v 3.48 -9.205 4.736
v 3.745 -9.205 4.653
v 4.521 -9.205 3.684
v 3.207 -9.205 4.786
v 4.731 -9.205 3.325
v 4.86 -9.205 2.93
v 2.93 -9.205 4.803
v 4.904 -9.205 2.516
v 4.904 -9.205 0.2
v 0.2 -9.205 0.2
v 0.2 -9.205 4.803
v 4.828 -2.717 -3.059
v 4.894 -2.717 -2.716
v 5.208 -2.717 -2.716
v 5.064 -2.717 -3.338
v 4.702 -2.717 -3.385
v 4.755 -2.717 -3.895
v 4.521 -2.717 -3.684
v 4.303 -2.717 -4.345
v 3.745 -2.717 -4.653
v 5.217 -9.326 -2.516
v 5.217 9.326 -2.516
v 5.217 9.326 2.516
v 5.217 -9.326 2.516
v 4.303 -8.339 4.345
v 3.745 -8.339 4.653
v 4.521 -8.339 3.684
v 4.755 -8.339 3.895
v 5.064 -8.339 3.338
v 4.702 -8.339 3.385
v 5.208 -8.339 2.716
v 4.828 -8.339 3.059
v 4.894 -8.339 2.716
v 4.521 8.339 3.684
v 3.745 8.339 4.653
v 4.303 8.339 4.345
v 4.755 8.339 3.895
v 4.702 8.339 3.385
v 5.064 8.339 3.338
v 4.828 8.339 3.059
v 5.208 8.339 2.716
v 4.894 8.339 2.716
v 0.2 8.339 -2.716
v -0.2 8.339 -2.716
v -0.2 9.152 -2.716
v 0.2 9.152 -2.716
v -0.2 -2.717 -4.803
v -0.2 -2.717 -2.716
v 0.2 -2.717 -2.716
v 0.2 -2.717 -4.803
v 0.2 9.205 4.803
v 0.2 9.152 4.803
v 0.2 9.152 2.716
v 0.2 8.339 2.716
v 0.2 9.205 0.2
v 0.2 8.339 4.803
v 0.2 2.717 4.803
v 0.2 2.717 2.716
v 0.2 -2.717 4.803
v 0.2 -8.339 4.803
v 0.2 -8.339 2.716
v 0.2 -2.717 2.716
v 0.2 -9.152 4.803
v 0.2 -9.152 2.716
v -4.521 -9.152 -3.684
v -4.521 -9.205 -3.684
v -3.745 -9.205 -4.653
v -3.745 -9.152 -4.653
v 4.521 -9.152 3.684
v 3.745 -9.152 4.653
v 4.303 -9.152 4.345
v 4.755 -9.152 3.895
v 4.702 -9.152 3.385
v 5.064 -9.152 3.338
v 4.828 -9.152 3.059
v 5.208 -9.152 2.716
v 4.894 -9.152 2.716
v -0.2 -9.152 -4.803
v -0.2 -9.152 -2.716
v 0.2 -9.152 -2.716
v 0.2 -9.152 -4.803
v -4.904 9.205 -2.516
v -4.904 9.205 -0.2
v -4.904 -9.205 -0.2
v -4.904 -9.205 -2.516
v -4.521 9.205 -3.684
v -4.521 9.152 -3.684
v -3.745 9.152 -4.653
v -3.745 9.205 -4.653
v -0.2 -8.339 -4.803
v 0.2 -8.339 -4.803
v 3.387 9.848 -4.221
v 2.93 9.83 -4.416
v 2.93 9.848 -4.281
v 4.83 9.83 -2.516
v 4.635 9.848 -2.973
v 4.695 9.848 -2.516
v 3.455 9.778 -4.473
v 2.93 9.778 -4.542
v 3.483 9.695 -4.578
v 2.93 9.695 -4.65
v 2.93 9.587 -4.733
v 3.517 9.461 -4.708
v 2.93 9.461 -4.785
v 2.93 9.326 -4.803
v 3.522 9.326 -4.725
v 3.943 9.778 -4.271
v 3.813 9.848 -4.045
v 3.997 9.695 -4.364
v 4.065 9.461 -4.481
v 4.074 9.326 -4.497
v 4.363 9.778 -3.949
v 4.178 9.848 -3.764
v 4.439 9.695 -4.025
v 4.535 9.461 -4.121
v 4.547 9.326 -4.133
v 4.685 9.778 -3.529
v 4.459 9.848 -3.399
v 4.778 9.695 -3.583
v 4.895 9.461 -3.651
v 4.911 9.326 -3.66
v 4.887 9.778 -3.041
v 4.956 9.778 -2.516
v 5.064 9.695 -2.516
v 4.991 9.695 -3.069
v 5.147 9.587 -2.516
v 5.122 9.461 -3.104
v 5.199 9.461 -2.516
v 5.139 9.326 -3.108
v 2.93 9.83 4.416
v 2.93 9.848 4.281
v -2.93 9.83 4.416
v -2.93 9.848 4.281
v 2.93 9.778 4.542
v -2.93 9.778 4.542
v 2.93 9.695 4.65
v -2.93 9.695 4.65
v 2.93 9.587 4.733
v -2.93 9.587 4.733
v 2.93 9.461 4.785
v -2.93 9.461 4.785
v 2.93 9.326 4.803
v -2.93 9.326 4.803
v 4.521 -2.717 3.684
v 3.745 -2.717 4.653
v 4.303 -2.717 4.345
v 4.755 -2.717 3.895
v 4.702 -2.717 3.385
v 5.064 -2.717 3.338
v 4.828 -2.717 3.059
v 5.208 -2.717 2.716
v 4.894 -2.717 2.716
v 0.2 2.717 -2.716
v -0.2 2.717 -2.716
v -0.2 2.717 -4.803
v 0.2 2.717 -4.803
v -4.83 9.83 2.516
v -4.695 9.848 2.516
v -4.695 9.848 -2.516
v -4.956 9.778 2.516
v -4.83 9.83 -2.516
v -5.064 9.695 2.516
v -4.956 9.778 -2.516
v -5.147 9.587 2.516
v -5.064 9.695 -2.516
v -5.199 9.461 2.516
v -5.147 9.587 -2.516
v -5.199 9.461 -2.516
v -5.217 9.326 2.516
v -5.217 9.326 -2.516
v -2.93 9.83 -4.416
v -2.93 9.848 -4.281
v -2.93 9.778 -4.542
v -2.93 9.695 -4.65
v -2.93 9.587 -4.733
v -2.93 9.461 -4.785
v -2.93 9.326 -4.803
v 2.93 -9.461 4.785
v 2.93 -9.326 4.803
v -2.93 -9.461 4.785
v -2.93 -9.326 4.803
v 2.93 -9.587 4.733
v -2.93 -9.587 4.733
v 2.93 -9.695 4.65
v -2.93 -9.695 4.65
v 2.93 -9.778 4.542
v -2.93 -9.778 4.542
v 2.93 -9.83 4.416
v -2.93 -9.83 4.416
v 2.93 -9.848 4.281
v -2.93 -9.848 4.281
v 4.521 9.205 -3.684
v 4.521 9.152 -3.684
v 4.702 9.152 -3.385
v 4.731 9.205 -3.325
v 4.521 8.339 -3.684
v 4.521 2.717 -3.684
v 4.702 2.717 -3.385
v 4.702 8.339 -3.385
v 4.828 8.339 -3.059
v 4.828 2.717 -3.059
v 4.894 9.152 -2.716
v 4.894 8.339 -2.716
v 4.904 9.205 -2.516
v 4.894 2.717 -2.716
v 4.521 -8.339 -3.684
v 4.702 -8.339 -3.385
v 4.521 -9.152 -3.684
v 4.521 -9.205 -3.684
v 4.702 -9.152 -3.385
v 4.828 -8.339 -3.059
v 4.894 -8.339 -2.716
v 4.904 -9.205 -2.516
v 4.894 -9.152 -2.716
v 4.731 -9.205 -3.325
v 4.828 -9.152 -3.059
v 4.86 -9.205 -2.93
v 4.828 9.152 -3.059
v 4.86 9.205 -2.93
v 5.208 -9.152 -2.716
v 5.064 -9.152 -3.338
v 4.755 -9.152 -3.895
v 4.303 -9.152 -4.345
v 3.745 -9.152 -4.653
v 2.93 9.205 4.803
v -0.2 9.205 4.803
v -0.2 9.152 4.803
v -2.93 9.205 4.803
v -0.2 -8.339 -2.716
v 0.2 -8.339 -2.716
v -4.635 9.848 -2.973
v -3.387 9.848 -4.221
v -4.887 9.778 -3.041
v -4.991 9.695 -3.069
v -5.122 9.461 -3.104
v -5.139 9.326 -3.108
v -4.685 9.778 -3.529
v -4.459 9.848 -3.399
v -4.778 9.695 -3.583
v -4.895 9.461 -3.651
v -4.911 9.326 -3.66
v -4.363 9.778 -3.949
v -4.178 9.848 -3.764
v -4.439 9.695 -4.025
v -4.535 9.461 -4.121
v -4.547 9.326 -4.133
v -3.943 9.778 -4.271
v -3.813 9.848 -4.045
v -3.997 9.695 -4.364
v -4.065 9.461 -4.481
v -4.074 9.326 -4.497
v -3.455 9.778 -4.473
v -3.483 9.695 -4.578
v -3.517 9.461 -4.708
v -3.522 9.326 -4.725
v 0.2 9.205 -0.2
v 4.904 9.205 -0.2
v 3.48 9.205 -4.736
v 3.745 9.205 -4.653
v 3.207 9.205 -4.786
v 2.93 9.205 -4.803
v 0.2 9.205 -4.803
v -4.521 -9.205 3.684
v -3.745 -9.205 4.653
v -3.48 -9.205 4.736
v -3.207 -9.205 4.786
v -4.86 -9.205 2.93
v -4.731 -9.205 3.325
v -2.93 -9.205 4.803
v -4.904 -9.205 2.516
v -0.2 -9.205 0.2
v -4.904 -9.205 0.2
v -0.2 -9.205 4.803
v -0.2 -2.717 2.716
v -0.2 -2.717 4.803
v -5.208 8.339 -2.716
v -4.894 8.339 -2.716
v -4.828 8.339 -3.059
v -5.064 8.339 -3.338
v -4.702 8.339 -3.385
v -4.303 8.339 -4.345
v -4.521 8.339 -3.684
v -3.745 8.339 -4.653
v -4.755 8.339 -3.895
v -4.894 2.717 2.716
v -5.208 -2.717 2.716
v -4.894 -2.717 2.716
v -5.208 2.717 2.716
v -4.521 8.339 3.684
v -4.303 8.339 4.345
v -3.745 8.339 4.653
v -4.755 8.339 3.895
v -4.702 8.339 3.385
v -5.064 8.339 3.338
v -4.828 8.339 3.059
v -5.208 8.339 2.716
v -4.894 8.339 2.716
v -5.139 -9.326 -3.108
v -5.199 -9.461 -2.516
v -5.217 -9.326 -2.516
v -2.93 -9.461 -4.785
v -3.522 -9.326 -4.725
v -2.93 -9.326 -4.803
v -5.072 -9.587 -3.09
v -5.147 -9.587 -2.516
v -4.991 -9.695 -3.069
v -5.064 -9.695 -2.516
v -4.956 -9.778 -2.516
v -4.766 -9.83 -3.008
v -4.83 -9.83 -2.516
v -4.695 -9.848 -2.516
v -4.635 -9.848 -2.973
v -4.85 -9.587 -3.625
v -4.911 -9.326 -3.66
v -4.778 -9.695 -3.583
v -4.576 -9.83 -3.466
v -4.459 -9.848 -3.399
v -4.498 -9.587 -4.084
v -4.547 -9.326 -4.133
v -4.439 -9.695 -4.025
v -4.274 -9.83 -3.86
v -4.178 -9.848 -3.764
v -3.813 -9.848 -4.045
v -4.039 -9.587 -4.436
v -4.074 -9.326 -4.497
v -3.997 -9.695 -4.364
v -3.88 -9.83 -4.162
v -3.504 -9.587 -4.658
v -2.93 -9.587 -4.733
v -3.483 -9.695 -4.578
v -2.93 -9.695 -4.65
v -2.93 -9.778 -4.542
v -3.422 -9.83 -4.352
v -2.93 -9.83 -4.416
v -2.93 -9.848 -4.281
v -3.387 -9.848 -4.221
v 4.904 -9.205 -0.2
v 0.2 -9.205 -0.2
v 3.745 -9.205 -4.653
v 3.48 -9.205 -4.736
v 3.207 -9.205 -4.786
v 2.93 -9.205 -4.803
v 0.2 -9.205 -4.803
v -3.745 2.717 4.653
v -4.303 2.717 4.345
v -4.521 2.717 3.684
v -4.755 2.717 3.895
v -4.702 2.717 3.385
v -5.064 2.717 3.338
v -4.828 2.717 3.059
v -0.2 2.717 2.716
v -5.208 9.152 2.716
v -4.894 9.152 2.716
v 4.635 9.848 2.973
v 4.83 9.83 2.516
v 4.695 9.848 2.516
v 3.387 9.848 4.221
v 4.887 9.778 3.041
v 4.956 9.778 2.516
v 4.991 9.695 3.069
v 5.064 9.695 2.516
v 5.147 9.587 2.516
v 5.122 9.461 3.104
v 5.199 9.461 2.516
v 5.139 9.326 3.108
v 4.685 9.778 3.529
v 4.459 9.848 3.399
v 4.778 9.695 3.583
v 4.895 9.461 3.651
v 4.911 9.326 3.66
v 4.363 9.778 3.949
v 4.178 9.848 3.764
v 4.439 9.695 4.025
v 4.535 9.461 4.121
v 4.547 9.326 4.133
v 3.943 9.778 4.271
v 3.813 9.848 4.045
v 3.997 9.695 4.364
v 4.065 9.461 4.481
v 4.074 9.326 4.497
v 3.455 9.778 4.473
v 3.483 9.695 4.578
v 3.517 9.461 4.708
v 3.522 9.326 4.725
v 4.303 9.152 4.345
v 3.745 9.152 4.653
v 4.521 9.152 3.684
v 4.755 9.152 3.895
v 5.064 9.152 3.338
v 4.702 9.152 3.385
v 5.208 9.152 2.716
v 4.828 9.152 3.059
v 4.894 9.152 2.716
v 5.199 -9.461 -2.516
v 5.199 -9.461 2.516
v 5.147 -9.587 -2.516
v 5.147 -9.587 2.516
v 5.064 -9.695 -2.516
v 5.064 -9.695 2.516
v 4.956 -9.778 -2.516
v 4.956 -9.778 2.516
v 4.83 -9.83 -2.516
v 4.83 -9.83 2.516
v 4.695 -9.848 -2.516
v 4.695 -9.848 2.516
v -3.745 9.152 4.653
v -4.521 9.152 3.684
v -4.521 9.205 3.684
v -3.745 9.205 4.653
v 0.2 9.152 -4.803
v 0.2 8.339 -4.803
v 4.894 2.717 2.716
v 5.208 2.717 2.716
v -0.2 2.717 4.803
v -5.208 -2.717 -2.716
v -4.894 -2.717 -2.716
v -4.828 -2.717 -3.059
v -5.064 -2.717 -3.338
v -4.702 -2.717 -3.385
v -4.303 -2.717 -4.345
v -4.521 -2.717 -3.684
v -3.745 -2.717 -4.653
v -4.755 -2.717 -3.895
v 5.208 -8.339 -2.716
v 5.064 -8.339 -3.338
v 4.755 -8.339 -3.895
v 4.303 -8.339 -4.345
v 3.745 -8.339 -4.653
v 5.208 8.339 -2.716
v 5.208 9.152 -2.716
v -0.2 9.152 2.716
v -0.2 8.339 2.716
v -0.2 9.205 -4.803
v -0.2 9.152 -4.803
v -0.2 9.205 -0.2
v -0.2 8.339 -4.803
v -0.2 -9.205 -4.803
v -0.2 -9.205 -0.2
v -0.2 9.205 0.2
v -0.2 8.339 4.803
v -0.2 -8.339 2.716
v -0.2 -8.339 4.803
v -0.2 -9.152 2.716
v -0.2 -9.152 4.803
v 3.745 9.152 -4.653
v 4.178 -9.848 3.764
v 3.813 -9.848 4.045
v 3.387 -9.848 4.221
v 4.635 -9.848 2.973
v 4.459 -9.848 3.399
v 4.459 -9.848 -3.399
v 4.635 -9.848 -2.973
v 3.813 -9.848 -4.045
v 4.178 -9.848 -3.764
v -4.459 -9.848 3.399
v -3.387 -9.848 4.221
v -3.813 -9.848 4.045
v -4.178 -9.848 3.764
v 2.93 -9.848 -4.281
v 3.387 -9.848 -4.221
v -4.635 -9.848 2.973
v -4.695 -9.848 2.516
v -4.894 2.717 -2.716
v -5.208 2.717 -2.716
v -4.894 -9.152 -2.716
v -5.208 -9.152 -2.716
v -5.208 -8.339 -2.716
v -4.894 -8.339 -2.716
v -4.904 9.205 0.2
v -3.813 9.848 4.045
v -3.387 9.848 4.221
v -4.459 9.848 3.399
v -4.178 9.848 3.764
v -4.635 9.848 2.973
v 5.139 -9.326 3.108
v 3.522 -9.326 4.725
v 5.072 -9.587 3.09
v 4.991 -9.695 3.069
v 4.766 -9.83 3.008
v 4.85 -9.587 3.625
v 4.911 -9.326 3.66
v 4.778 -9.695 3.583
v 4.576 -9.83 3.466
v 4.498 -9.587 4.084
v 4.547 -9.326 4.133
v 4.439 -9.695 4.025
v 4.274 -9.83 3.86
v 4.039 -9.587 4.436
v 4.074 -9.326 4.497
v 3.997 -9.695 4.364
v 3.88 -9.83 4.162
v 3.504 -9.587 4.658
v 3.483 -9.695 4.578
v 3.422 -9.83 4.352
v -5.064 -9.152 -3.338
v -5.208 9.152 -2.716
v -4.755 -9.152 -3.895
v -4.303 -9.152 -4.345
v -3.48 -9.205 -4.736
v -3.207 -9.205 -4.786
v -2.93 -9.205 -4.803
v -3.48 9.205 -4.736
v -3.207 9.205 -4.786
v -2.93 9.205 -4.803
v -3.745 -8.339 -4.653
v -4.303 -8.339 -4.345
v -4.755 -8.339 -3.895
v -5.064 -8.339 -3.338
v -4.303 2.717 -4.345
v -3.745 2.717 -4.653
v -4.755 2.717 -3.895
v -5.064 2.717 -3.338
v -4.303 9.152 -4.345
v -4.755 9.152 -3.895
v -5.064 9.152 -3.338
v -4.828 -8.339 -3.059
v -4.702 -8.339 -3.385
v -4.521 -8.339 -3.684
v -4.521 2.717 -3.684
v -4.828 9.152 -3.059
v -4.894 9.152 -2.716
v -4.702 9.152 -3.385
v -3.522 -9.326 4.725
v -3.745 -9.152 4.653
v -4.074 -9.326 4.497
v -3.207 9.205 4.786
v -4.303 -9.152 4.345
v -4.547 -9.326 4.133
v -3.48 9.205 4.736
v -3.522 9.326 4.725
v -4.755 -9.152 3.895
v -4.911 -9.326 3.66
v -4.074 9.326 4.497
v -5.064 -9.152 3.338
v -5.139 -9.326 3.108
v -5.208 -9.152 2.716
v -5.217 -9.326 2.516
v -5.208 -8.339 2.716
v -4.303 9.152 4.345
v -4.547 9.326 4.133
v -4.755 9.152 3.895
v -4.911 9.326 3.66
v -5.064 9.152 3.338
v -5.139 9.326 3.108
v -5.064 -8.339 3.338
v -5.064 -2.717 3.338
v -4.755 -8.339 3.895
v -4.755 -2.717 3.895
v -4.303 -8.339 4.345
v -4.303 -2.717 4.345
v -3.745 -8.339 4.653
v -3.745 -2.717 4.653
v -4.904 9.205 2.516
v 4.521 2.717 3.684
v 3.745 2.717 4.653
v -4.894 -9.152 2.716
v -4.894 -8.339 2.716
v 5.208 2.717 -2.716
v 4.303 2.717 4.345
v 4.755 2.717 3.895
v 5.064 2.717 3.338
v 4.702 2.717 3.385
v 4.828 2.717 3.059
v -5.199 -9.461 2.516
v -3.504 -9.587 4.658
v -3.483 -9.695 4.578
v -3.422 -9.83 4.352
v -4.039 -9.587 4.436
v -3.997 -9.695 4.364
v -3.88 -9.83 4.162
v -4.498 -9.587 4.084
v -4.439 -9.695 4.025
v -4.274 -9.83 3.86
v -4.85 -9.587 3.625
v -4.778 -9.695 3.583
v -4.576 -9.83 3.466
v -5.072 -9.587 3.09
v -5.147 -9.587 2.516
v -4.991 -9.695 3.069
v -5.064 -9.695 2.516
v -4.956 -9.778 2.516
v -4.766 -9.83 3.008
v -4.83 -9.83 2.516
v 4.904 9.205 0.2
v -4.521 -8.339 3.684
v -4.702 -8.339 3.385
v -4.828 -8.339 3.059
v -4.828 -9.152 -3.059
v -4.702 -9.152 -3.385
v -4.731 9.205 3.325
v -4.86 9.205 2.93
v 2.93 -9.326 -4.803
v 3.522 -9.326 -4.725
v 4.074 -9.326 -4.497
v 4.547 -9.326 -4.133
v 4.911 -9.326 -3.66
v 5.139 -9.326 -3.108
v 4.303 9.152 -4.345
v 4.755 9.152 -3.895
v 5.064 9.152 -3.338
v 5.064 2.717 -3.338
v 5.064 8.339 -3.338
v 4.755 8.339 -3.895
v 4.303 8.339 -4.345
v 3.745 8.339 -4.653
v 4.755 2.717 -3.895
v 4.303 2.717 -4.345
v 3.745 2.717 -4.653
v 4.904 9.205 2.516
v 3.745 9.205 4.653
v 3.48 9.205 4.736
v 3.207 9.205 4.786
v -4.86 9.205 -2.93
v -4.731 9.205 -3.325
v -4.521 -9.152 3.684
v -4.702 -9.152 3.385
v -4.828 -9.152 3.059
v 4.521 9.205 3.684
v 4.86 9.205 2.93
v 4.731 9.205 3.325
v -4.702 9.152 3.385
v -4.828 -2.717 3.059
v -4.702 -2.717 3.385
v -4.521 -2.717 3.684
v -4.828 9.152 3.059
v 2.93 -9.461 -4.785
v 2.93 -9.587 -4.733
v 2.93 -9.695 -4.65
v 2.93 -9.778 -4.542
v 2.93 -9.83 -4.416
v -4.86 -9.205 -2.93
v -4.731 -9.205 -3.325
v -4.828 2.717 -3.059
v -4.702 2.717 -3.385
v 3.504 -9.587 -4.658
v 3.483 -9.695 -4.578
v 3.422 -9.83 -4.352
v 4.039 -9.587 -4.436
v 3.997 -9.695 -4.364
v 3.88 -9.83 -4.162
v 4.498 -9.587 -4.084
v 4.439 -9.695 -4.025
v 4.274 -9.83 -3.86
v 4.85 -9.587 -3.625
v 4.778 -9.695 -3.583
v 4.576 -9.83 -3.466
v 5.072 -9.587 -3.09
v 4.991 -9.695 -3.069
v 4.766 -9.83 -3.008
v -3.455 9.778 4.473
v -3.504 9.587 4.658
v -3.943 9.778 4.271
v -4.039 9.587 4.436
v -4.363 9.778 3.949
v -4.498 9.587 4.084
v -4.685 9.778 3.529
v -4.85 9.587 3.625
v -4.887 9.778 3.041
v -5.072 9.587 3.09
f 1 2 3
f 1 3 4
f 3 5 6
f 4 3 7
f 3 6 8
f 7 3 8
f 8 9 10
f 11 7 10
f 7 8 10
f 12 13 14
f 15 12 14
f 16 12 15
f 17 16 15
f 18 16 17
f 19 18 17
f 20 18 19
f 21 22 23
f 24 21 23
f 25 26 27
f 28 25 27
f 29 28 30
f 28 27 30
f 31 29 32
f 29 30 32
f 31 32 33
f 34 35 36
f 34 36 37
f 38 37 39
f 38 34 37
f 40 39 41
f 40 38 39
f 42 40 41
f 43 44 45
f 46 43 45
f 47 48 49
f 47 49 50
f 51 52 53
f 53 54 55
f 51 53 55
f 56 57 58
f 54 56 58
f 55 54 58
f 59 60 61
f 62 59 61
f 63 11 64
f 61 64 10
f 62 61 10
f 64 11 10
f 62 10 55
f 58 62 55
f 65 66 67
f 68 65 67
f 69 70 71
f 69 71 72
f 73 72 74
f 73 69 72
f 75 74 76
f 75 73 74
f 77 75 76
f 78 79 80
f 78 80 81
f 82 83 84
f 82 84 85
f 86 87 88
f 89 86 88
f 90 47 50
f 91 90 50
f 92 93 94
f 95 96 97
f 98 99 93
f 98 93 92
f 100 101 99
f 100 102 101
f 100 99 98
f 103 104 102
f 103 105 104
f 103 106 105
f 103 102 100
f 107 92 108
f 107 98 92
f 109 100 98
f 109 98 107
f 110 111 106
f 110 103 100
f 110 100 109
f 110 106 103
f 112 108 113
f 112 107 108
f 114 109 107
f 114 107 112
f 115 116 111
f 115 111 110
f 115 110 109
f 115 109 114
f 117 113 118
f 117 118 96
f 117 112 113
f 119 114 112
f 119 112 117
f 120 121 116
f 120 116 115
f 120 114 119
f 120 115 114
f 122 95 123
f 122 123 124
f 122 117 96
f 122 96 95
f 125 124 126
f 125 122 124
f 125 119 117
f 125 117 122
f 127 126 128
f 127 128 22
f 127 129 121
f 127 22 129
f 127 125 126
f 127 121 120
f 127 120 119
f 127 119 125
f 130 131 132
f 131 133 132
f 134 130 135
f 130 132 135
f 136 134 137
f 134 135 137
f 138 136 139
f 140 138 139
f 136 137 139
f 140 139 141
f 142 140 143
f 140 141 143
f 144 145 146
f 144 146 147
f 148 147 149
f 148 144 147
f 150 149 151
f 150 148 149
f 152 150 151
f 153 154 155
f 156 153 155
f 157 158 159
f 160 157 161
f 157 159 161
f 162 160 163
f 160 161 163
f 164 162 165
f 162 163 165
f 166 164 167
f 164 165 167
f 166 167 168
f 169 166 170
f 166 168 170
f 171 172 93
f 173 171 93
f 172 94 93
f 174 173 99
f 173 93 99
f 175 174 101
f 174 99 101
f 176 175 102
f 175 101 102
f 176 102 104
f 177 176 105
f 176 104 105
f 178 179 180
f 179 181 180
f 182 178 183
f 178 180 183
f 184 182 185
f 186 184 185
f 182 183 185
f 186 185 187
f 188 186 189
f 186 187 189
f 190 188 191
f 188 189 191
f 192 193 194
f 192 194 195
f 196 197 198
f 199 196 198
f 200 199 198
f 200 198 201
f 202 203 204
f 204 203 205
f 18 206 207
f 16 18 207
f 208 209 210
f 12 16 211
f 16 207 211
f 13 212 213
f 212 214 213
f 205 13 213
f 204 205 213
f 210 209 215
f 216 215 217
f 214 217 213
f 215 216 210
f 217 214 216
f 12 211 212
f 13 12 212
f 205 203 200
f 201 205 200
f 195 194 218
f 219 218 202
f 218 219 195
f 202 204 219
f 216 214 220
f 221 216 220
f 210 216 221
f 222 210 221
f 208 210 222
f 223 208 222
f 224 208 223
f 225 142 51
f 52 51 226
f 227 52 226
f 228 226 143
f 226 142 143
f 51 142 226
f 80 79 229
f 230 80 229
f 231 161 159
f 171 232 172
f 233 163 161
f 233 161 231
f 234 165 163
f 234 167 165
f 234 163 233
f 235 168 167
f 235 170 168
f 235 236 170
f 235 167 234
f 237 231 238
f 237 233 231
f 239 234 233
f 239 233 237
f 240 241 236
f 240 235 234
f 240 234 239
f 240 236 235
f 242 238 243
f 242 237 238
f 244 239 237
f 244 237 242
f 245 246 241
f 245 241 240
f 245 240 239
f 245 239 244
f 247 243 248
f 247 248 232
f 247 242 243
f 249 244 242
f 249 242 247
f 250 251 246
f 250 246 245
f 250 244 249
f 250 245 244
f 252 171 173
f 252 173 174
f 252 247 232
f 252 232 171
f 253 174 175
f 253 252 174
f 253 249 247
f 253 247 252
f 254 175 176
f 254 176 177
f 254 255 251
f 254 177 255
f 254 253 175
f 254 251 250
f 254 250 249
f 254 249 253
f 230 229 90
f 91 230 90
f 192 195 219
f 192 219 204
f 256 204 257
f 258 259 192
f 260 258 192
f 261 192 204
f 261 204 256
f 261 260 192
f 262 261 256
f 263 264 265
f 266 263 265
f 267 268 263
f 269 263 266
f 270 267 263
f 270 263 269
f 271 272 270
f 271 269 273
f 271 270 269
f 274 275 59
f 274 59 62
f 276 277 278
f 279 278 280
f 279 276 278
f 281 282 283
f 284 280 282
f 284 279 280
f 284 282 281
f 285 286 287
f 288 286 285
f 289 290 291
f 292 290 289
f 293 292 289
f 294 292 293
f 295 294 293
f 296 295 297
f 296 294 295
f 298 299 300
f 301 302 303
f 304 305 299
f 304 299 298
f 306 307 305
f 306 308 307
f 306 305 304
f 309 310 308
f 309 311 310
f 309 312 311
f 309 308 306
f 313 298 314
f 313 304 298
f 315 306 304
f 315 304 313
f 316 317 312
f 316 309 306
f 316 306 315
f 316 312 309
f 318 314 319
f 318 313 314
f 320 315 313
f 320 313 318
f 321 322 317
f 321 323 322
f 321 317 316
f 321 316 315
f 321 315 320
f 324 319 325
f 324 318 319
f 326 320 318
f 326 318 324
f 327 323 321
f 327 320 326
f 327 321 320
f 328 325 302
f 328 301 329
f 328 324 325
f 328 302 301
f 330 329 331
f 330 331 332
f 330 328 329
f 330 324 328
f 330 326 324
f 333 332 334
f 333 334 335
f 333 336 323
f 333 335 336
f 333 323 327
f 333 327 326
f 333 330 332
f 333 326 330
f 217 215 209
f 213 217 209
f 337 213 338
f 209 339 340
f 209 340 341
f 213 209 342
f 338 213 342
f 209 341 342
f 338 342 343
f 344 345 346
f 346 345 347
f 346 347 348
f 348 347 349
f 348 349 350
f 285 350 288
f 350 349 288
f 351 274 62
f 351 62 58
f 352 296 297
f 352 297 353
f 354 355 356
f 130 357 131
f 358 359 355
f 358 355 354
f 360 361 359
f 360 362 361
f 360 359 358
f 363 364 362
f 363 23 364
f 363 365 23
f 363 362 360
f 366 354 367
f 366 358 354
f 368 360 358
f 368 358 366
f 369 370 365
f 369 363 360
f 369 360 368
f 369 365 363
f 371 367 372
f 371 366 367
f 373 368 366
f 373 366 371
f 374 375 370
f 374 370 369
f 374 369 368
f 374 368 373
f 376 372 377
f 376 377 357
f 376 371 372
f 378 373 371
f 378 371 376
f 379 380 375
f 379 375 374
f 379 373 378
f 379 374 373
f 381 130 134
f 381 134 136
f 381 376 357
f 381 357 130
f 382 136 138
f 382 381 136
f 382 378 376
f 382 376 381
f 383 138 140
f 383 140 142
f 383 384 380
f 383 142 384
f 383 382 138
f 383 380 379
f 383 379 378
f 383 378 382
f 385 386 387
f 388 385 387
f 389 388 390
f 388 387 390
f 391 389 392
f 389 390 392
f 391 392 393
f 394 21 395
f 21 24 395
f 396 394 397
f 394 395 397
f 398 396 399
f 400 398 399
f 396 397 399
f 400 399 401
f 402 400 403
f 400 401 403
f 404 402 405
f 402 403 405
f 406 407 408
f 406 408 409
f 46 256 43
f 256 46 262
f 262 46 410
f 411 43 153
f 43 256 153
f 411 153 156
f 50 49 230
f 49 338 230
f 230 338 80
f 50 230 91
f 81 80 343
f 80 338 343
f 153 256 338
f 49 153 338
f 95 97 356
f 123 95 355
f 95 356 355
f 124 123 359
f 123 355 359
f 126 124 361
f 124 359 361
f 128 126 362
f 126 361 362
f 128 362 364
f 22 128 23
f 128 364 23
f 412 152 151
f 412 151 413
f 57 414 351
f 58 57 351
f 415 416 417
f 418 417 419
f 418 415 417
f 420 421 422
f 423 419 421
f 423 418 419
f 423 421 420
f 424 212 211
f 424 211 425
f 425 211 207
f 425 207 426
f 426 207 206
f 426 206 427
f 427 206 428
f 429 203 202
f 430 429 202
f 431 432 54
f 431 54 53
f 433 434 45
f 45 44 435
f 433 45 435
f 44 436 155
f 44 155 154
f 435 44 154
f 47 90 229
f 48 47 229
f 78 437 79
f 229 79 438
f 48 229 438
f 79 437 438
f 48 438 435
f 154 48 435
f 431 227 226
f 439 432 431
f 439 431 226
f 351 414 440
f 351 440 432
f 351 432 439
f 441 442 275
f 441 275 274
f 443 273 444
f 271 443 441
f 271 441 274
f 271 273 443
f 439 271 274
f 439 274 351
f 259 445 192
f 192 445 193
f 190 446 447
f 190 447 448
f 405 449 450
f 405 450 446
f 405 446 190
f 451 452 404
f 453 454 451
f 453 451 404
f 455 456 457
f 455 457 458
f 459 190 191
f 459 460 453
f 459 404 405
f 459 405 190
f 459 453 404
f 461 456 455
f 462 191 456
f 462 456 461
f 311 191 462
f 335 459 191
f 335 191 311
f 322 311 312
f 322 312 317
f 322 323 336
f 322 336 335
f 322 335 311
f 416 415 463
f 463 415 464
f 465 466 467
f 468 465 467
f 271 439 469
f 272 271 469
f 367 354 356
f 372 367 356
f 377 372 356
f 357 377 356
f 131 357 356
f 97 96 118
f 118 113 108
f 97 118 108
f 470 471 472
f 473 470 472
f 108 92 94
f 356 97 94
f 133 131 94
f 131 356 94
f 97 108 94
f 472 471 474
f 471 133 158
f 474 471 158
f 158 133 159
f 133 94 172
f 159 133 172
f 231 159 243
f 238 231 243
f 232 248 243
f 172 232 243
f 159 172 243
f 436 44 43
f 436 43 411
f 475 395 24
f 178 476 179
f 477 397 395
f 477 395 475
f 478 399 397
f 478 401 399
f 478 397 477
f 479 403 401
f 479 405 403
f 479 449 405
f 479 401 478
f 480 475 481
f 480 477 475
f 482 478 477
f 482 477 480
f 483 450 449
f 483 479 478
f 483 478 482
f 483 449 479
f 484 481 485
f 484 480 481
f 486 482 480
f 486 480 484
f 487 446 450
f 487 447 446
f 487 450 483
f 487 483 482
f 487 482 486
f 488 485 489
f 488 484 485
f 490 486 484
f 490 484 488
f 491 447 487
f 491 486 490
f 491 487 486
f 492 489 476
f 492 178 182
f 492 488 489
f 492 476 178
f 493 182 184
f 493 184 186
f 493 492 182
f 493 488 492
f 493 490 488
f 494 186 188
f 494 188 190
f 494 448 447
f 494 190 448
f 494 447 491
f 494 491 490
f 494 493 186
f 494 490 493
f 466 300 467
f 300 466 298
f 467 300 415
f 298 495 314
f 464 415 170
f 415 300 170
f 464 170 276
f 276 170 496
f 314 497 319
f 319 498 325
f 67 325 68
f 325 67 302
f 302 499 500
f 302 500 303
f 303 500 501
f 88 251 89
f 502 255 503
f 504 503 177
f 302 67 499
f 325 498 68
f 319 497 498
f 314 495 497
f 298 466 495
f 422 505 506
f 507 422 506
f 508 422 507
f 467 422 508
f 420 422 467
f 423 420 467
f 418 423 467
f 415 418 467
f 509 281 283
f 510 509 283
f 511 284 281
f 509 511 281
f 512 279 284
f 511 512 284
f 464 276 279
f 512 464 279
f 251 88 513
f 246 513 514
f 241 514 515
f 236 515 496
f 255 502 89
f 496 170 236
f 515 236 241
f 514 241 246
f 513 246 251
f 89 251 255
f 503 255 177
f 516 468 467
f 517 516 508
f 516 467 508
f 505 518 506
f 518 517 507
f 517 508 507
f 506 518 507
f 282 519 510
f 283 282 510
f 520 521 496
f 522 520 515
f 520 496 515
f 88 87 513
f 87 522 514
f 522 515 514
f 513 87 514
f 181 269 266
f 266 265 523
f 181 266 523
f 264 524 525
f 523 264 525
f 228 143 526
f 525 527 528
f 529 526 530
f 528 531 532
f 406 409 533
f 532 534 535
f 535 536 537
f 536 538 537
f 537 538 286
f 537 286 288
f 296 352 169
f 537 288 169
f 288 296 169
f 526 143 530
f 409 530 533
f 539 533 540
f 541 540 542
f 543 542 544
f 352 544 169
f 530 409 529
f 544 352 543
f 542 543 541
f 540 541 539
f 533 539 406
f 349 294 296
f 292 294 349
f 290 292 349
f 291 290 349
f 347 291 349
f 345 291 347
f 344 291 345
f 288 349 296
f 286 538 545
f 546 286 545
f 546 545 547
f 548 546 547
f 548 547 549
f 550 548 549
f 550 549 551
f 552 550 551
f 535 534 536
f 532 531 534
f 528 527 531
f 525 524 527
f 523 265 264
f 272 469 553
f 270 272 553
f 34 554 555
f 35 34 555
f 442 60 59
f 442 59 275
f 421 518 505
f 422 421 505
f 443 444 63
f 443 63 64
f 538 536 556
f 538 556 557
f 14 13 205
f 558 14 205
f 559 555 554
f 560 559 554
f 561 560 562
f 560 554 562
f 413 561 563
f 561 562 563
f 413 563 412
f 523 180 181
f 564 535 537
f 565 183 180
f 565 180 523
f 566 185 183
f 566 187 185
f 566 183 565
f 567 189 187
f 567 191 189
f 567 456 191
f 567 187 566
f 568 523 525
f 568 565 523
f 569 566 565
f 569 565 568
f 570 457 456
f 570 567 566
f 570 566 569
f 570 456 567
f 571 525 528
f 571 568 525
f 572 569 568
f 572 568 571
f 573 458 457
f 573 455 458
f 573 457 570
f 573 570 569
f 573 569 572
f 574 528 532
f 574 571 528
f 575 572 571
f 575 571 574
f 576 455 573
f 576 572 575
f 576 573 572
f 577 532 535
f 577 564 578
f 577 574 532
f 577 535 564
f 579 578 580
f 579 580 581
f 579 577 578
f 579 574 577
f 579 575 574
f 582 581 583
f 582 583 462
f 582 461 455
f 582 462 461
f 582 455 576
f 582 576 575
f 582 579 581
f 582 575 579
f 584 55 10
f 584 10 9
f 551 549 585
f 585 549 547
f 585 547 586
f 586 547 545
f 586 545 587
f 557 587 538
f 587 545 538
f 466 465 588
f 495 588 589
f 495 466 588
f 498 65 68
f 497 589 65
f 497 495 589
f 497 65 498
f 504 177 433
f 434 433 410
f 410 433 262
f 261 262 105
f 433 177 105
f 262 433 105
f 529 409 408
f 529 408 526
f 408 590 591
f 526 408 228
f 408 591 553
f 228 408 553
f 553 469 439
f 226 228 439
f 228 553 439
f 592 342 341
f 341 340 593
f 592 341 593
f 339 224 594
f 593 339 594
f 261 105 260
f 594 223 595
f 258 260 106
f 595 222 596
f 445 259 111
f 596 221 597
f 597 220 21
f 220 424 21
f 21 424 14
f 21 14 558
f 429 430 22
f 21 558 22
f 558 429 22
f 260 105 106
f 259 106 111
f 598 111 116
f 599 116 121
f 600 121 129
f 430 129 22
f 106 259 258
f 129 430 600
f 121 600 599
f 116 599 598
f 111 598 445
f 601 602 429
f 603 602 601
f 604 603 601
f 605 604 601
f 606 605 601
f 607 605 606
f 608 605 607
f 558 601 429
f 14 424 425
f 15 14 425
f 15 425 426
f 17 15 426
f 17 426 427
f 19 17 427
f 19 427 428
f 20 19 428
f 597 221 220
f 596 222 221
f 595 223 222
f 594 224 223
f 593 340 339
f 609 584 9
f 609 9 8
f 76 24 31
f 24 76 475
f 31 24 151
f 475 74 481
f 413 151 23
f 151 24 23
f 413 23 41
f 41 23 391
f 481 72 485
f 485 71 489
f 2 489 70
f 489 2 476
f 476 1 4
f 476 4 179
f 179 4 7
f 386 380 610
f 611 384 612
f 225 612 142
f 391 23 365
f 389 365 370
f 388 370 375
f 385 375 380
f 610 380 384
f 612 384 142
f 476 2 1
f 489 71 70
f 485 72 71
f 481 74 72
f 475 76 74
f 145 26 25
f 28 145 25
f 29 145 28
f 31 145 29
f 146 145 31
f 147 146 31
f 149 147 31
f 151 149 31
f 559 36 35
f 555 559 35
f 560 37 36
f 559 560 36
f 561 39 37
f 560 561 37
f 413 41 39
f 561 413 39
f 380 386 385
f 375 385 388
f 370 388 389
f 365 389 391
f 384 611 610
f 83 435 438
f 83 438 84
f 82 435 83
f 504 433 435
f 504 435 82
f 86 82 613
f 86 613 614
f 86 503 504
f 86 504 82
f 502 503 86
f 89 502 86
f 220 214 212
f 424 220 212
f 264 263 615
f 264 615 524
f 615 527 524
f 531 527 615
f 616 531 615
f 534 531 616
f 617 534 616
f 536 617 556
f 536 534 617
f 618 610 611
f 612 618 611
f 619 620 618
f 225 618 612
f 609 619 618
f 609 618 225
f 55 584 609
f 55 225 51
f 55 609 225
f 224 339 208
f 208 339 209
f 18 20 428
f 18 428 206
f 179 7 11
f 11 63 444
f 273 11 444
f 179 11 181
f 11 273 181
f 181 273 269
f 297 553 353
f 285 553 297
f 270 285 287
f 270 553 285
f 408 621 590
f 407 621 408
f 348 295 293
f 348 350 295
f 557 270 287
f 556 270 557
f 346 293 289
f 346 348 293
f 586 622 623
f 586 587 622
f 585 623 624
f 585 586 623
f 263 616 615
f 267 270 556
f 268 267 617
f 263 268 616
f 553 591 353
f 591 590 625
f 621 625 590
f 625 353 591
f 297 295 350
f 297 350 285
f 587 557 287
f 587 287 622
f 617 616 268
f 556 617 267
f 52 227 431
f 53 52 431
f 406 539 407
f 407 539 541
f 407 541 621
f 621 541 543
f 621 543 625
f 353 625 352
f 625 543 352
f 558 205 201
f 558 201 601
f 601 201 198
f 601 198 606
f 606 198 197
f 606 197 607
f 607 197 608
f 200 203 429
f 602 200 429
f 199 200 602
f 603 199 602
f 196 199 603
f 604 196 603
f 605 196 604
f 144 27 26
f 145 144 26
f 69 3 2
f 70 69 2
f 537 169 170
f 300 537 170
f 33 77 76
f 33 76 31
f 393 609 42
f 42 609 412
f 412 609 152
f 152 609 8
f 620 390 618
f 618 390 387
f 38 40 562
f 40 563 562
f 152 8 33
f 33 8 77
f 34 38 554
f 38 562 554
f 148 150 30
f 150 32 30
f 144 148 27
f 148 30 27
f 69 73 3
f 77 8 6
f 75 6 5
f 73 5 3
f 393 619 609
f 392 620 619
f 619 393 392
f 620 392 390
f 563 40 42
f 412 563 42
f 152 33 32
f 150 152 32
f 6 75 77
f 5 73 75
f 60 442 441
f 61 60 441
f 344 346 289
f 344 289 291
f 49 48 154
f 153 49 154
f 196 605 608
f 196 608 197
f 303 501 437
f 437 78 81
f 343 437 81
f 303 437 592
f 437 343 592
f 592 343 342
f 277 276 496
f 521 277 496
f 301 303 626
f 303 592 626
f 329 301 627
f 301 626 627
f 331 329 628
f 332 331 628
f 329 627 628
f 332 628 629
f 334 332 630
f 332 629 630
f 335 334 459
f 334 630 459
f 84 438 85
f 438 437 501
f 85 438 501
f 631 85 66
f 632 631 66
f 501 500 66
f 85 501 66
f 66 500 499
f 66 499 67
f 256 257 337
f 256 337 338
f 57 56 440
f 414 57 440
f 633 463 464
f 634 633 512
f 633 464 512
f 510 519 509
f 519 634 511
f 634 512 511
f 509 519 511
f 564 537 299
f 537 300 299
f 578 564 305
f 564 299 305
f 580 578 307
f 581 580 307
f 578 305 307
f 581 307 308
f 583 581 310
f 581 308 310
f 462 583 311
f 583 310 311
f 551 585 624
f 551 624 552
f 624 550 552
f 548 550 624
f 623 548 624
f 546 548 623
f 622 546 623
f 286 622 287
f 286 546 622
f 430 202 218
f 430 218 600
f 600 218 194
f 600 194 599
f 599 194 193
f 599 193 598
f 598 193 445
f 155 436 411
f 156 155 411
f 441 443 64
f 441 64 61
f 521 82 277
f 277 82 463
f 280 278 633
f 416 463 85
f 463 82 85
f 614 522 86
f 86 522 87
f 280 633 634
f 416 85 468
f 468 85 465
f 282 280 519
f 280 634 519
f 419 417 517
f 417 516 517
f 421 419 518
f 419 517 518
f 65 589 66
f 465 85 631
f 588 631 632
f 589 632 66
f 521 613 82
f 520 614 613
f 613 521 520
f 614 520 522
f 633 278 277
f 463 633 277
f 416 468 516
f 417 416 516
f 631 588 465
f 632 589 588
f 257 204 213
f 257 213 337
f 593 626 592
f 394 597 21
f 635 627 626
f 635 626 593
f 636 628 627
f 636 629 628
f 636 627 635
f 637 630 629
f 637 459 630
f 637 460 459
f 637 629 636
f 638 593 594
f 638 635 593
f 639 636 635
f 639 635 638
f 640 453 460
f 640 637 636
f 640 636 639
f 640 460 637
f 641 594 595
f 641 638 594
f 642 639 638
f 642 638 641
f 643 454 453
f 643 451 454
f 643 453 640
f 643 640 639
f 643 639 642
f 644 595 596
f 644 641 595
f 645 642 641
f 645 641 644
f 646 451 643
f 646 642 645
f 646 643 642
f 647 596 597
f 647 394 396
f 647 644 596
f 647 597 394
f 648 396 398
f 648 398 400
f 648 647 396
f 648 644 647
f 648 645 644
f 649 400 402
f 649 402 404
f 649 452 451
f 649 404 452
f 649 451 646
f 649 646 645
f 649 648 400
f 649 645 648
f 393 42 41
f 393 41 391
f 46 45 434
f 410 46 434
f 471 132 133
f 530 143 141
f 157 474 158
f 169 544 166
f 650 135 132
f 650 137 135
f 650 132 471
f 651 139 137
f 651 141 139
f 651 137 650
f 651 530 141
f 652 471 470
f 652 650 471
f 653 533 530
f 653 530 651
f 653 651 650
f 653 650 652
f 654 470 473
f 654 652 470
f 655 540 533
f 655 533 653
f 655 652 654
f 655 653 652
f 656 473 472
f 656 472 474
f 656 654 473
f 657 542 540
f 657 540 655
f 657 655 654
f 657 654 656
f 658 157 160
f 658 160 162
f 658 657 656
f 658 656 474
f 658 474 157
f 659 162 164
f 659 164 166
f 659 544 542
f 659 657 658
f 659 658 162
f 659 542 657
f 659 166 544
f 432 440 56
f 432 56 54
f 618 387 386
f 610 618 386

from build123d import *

# Parameters (mm, degrees)
BOSS_EXTRUDE1_DEPTH     = 28.315
FILLET1_R               = 1.5
CUT_EXTRUDE2_DEPTH      = 26.465
CUT_EXTRUDE2_DEPTH_BACK = 26.465
CUT_EXTRUDE3_DEPTH      = 35.892052501
CUT_EXTRUDE3_DEPTH_BACK = 35.892052501
SKETCH7_W               = 8.863459335
SKETCH7_H               = 15.62219905
SKETCH7_H_2             = 2.337495039
SCALE1_SCALE            = 0.3478


with BuildPart() as part:
    # Sketch1 → Boss-Extrude1 (new, symmetric)
    with BuildSketch(Plane(origin=(0, 0, 0), x_dir=(1, 0, 0), z_dir=(0, 1, 0))):
        with BuildLine():
            Line((-8.425, 13.81), (8.425, 13.81))
            ThreePointArc((8.425, 13.81), (13.074227086, 11.884227086), (15, 7.235))
            Line((15, 7.235), (15, -7.235))
            ThreePointArc((15, -7.235), (13.074227086, -11.884227086), (8.425, -13.81))
            Line((8.425, -13.81), (-8.425, -13.81))
            ThreePointArc((-8.425, -13.81), (-13.074227086, -11.884227086), (-15, -7.235))
            Line((-15, -7.235), (-15, 7.235))
            ThreePointArc((-15, 7.235), (-13.074227086, 11.884227086), (-8.425, 13.81))
        make_face()
    extrude(amount=BOSS_EXTRUDE1_DEPTH, both=True)

    # Fillet1
    fillet1_edges = [part.edges().sort_by_distance(p)[0] for p in [
        (0, -28.315, 13.81),
        (-13.074227086, -28.315, 11.884227086),
        (-15, -28.315, 0),
        (-13.074227086, -28.315, -11.884227086),
        (-13.074227086, 28.315, 11.884227086),
        (0, 28.315, 13.81),
        (13.074227086, 28.315, 11.884227086),
        (15, 28.315, 0),
        (13.074227086, 28.315, -11.884227086),
        (0, 28.315, -13.81),
        (-13.074227086, 28.315, -11.884227086),
        (0, -28.315, -13.81),
        (-15, 28.315, 0),
        (13.074227086, -28.315, -11.884227086),
        (15, -28.315, 0),
        (13.074227086, -28.315, 11.884227086),
    ]]
    fillet(fillet1_edges, radius=FILLET1_R)

    # Sketch6 → Cut-Extrude2 (cut, two sides: drawn at the far end of the back side and taken through both)
    with BuildSketch(Plane(origin=(0, 0, 0), x_dir=(1, 0, 0), z_dir=(0, 1, 0)).offset(-CUT_EXTRUDE2_DEPTH_BACK)):
        with BuildLine():
            Line((-0.575, -0.575), (-14.1, -0.575))
            Line((-14.1, -0.575), (-14.1, -7.235))
            ThreePointArc((-14.1, -7.235), (-13.817993139, -9.001705974), (-13, -10.592826678))
            Line((-13, -10.592826678), (-8.866634788, -15.748593929))
            Line((-8.866634788, -15.748593929), (-0.575, -15.748593929))
            Line((-0.575, -15.748593929), (-0.575, -7.235))
            Line((-0.575, -7.235), (-0.575, -0.575))
        make_face()
        with BuildLine():
            Line((14.1, -0.575), (14.1, -7.235))
            ThreePointArc((14.1, -7.235), (13.817993139, -9.001705974), (13, -10.592826678))
            Line((13, -10.592826678), (8.866634788, -15.748593929))
            Line((8.866634788, -15.748593929), (0.575, -15.748593929))
            Line((0.575, -15.748593929), (0.575, -7.235))
            Line((0.575, -7.235), (0.575, -0.575))
            Line((0.575, -0.575), (14.1, -0.575))
        make_face()
        with BuildLine():
            Line((0.575, 0.575), (0.575, 7.235))
            Line((0.575, 7.235), (0.575, 15.748593929))
            Line((0.575, 15.748593929), (8.866634788, 15.748593929))
            Line((8.866634788, 15.748593929), (13, 10.592826678))
            ThreePointArc((13, 10.592826678), (13.817993139, 9.001705974), (14.1, 7.235))
            Line((14.1, 7.235), (14.1, 0.575))
            Line((14.1, 0.575), (0.575, 0.575))
        make_face()
        with BuildLine():
            Line((-14.1, 0.575), (-14.1, 7.235))
            ThreePointArc((-14.1, 7.235), (-13.817993139, 9.001705974), (-13, 10.592826678))
            Line((-13, 10.592826678), (-8.866634788, 15.748593929))
            Line((-8.866634788, 15.748593929), (-0.575, 15.748593929))
            Line((-0.575, 15.748593929), (-0.575, 7.235))
            Line((-0.575, 7.235), (-0.575, 0.575))
            Line((-0.575, 0.575), (-14.1, 0.575))
        make_face()
    extrude(amount=CUT_EXTRUDE2_DEPTH + CUT_EXTRUDE2_DEPTH_BACK, mode=Mode.SUBTRACT)

    # Sketch7 → Cut-Extrude3 (cut, two sides: drawn at the far end of the back side and taken through both)
    with BuildSketch(Plane(origin=(0, 0, 0), x_dir=(0, 0, -1), z_dir=(1, 0, 0)).offset(-CUT_EXTRUDE3_DEPTH_BACK)):
        with Locations((-12.241729667, 0)):
            Rectangle(SKETCH7_W, SKETCH7_H)
        with Locations((12.241729667, 0)):
            Rectangle(SKETCH7_W, SKETCH7_H)
        with Locations((-12.241729667, -25.146252481)):
            Rectangle(SKETCH7_W, SKETCH7_H_2)
        with Locations((-12.241729667, 25.146252481)):
            Rectangle(SKETCH7_W, SKETCH7_H_2)
        with Locations((12.241729667, 25.146252481)):
            Rectangle(SKETCH7_W, SKETCH7_H_2)
        with Locations((12.241729667, -25.146252481)):
            Rectangle(SKETCH7_W, SKETCH7_H_2)
    extrude(amount=CUT_EXTRUDE3_DEPTH + CUT_EXTRUDE3_DEPTH_BACK, mode=Mode.SUBTRACT)


with BuildPart() as part_1:
    # Scale1: scaled about (0, 0, 0)
    add(part.part.scale(SCALE1_SCALE))


solid = part_1.part
